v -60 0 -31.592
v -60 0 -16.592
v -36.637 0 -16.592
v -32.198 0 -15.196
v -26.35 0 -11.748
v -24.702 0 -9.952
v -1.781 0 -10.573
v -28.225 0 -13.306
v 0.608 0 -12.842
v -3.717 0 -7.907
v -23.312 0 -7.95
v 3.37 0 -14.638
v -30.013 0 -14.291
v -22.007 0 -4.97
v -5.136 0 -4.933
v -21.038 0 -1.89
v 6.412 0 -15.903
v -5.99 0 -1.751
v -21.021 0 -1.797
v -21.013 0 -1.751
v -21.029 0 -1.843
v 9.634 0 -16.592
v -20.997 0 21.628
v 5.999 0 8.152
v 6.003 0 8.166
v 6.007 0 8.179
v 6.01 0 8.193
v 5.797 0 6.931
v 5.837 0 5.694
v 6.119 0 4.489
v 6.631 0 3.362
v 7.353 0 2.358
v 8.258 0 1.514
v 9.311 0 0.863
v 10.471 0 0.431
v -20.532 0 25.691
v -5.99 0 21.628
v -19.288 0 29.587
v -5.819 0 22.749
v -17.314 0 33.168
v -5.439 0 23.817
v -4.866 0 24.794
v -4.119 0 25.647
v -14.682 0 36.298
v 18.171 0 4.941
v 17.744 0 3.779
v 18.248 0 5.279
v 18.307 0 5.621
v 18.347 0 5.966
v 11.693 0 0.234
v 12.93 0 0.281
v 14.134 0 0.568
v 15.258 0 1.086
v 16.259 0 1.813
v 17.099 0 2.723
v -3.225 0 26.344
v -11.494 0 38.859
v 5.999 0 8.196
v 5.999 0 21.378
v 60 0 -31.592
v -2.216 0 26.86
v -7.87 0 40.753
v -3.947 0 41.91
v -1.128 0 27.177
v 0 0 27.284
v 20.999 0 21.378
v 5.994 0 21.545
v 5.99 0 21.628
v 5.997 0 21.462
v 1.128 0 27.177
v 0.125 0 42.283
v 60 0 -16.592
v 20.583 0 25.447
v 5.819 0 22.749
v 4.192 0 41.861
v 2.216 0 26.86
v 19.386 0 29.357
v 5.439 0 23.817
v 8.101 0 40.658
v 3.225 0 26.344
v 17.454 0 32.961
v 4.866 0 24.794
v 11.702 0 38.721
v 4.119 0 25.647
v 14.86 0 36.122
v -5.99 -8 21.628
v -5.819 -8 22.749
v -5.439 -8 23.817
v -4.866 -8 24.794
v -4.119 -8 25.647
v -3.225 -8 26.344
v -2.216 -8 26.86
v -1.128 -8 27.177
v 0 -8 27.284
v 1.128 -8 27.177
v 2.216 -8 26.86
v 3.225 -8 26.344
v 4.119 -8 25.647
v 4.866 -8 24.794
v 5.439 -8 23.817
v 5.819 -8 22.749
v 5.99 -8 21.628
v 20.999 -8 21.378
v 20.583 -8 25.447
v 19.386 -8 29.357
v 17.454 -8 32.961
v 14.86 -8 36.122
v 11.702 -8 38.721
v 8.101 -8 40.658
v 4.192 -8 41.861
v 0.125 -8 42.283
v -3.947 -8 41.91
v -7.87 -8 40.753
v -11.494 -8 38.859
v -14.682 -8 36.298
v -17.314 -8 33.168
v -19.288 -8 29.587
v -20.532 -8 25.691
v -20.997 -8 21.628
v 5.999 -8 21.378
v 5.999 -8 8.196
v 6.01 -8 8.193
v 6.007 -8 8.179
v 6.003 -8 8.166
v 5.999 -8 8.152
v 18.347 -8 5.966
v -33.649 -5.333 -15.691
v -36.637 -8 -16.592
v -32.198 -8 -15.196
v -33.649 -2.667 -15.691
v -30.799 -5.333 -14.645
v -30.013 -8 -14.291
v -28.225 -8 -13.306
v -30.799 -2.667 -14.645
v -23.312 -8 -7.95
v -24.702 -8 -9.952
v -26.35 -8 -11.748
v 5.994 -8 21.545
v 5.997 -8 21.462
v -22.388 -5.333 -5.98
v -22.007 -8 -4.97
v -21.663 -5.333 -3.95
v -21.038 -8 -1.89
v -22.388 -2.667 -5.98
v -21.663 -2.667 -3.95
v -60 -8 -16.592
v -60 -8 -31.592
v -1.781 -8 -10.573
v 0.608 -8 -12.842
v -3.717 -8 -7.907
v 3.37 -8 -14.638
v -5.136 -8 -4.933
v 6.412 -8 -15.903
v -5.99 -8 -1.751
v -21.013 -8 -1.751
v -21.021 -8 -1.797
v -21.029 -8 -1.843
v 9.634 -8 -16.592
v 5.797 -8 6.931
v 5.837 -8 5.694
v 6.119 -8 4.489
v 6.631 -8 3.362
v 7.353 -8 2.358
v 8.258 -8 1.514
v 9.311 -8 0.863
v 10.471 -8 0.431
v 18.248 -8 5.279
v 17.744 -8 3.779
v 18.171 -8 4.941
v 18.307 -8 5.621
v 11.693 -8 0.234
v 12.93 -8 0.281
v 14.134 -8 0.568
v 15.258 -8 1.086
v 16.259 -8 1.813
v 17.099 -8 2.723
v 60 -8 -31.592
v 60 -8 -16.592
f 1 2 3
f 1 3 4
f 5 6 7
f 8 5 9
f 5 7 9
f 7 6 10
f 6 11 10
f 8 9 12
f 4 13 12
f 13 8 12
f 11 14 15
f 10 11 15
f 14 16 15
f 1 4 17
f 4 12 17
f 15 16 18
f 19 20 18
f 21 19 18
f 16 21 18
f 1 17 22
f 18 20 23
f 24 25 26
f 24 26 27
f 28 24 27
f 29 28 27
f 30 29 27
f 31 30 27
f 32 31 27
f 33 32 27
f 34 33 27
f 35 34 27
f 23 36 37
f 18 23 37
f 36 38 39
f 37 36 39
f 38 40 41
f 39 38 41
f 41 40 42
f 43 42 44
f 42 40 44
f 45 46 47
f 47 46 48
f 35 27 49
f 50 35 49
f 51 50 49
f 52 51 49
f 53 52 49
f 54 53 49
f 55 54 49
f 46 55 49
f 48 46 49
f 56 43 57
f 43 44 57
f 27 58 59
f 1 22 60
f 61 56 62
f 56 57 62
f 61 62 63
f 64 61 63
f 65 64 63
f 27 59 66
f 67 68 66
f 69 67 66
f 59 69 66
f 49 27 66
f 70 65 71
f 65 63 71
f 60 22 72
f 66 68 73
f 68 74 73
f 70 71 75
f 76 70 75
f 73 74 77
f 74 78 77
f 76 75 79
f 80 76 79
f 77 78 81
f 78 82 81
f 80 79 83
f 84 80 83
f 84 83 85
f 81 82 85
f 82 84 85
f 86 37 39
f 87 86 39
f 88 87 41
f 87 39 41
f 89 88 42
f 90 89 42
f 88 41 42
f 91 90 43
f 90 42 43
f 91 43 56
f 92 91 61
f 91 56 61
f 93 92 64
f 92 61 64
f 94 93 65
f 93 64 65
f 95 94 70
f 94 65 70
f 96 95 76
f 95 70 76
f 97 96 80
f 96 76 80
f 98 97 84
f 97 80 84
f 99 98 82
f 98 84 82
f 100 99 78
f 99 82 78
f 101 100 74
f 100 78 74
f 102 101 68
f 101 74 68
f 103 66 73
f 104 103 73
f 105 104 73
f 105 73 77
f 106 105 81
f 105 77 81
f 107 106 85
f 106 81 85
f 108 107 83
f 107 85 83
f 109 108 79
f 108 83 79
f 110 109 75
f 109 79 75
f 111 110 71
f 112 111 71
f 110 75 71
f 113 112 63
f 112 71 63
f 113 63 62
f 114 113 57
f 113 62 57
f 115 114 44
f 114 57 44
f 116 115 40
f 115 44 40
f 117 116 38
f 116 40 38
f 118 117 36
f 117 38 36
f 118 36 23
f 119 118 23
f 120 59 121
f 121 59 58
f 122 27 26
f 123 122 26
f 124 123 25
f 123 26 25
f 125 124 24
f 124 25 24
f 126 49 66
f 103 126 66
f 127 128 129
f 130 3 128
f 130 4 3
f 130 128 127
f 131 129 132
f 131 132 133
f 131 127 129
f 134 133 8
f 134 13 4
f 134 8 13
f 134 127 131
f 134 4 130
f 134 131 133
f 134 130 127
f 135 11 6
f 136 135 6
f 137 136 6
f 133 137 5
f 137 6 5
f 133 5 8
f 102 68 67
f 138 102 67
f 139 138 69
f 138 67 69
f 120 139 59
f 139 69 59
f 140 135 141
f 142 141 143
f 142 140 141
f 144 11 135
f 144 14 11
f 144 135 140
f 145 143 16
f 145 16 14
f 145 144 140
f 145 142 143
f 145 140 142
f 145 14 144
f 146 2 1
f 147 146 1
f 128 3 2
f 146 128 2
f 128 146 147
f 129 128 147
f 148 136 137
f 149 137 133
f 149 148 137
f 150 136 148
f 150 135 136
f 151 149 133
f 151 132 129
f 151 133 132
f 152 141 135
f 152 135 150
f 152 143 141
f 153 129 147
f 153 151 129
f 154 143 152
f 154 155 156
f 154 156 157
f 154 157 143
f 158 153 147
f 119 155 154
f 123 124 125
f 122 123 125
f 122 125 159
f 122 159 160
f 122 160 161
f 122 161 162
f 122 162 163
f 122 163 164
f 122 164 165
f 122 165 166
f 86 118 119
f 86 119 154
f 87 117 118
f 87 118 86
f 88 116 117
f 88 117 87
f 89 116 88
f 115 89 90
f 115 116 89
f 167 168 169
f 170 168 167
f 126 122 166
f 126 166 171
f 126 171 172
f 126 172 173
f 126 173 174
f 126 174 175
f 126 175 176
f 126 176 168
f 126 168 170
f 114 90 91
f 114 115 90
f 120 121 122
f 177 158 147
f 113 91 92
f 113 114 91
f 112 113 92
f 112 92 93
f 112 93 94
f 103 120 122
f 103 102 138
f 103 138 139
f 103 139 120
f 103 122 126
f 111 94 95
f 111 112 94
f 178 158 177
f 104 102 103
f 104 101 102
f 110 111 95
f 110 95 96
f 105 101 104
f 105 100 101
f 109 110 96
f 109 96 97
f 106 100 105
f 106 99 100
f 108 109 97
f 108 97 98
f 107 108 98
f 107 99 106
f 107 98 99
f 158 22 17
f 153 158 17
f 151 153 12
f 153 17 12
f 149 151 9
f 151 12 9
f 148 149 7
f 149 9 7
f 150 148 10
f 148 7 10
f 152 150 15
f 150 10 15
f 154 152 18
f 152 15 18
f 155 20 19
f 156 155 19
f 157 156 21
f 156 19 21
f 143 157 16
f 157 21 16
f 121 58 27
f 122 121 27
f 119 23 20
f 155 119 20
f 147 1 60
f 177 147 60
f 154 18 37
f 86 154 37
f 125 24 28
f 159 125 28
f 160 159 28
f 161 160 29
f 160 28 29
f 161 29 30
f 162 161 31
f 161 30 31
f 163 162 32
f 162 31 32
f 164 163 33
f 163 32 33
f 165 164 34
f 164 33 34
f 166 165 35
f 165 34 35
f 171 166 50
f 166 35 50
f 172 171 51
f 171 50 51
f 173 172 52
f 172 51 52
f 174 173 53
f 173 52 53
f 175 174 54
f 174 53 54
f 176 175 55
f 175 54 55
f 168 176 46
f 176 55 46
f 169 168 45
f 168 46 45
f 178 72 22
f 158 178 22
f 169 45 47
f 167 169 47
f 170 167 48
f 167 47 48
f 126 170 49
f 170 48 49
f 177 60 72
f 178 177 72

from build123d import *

# Parameters (mm, degrees)
F1_DEPTH = 8


with BuildPart() as f1:
    # F0 (on Front) → F1 (new body)
    with BuildSketch(Plane.XZ):
        with BuildLine():
            Line((18.3469315144, 5.9655109539), (20.9992617956, 21.3784781252))
            ThreePointArc((20.9992617956, 21.3784781252), (0.1249015369, 42.2834629222), (-20.9966564617, 21.6282676124))
            Line((-20.9966564617, 21.6282676124), (-20.9966564617, -1.7508006927))
            add(Edge.make_bspline(
                [(-21.0375948323, -1.8897012773), (-21.0239493062, -1.8434000403), (-21.0103048446, -1.7970993287), (-20.9966564617, -1.7508006927)],
                knots=[0.9931808639, 0.9931808639, 0.9931808639, 0.9931808639, 1, 1, 1, 1], degree=3))
            add(Edge.make_bspline(
                [(-23.311607346, -7.9496343517), (-22.2567283878, -6.0202595283), (-21.6461032363, -3.9544580126), (-21.0375948323, -1.8897012773)],
                knots=[0.6890883985, 0.6890883985, 0.6890883985, 0.6890883985, 0.9931808639, 0.9931808639, 0.9931808639, 0.9931808639], degree=3))
            add(Edge.make_bspline(
                [(-28.2252900615, -13.3057116458), (-26.0825142955, -11.9279404299), (-24.4419956281, -10.0171158148), (-23.311607346, -7.9496343517)],
                knots=[0.3632286809, 0.3632286809, 0.3632286809, 0.3632286809, 0.6890883985, 0.6890883985, 0.6890883985, 0.6890883985], degree=3))
            add(Edge.make_bspline(
                [(-36.6373678698, -16.5920499712), (-33.6263584299, -15.7149316784), (-30.6137952155, -14.8414830049), (-28.2252900615, -13.3057116458)],
                knots=[0, 0, 0, 0, 0.3632286809, 0.3632286809, 0.3632286809, 0.3632286809], degree=3))
            Line((-36.6373678698, -16.5920499712), (-60, -16.5920499712))
            Line((-60, -16.5920499712), (-60, -31.5920499712))
            Line((-60, -31.5920499712), (60, -31.5920499712))
            Line((60, -31.5920499712), (60, -16.5920499712))
            Line((60, -16.5920499712), (9.6341452579, -16.5920499712))
            ThreePointArc((9.6341452579, -16.5920499712), (-0.638590167, -11.7618423985), (-5.9901359502, -1.7508006927))
            Line((-5.9901359502, -1.7508006927), (-5.9901359502, 1.160080022))
            Line((-5.9901359502, 1.160080022), (-5.9901359502, 20.940455724))
            ThreePointArc((-5.9901359502, 20.940455724), (-6, 21.2843616682), (-5.9901359502, 21.6282676124))
            ThreePointArc((-5.9901359502, 21.6282676124), (0, 27.2843616682), (5.9901359502, 21.6282676124))
            Line((5.9901359502, 21.6282676124), (5.9992617956, 21.6282676124))
            Line((5.9992617956, 21.6282676124), (5.9992617956, 21.3784781252))
            ThreePointArc((5.9992617956, 21.3784781252), (6, 21.2843616682), (5.9992617956, 21.1902452111))
            Line((5.9992617956, 21.1902452111), (5.9992617956, 8.1959165921))
            Line((5.9992617956, 8.1959165921), (6.0103126276, 8.1929609357))
            ThreePointArc((6.0103126276, 8.1929609357), (6.0047534058, 8.1727079211), (5.9992617956, 8.1524364691))
            ThreePointArc((5.9992617956, 8.1524364691), (10.4711267055, 0.4310945937), (18.1705571166, 4.9405809808))
            Line((18.1705571166, 4.9405809808), (18.3469315144, 5.9655109539))
        make_face()
        Polygon((-20.9966564617, -1.7508006927), (-20.9966564617, 21.6282676124), (-21.0130866617, -1.7508006927), align=None)
        with BuildLine():
            ThreePointArc((18.1705571166, 4.9405809808), (18.2799498035, 5.449396835), (18.3469315144, 5.9655109539))
            Line((18.3469315144, 5.9655109539), (18.1705571166, 4.9405809808))
        make_face()
        with BuildLine():
            add(Edge.make_bspline(
                [(-21.0375948323, -1.8897012773), (-21.0239493062, -1.8434000403), (-21.0103048446, -1.7970993287), (-20.9966564617, -1.7508006927)],
                knots=[0.9931808639, 0.9931808639, 0.9931808639, 0.9931808639, 1, 1, 1, 1], degree=3))
            Line((-20.9966564617, -1.7508006927), (-21.0130866617, -1.7508006927))
            ThreePointArc((-21.0130866617, -1.7508006927), (-21.0252049482, -1.8202749459), (-21.0375948323, -1.8897012773))
        make_face()
        with BuildLine():
            add(Edge.make_bspline(
                [(-28.2252900615, -13.3057116458), (-26.0825142955, -11.9279404299), (-24.4419956281, -10.0171158148), (-23.311607346, -7.9496343517)],
                knots=[0.3632286809, 0.3632286809, 0.3632286809, 0.3632286809, 0.6890883985, 0.6890883985, 0.6890883985, 0.6890883985], degree=3))
            ThreePointArc((-23.311607346, -7.9496343517), (-25.4958010969, -10.8778007993), (-28.2252900615, -13.3057116458))
        make_face()
        with BuildLine():
            Line((5.9992617956, 21.3784781252), (5.9992617956, 21.1902452111))
            ThreePointArc((5.9992617956, 21.1902452111), (6, 21.2843616682), (5.9992617956, 21.3784781252))
        make_face()
        with BuildLine():
            ThreePointArc((5.9901359502, 21.6282676124), (5.9959997727, 21.5034203961), (5.9992617956, 21.3784781252))
            Line((5.9992617956, 21.3784781252), (5.9992617956, 21.6282676124))
            Line((5.9992617956, 21.6282676124), (5.9901359502, 21.6282676124))
        make_face()
        with BuildLine():
            Line((-5.9901359502, 20.940455724), (-5.9901359502, 21.6282676124))
            ThreePointArc((-5.9901359502, 21.6282676124), (-6, 21.2843616682), (-5.9901359502, 20.940455724))
        make_face()
    extrude(amount=F1_DEPTH)


solid = f1.part
